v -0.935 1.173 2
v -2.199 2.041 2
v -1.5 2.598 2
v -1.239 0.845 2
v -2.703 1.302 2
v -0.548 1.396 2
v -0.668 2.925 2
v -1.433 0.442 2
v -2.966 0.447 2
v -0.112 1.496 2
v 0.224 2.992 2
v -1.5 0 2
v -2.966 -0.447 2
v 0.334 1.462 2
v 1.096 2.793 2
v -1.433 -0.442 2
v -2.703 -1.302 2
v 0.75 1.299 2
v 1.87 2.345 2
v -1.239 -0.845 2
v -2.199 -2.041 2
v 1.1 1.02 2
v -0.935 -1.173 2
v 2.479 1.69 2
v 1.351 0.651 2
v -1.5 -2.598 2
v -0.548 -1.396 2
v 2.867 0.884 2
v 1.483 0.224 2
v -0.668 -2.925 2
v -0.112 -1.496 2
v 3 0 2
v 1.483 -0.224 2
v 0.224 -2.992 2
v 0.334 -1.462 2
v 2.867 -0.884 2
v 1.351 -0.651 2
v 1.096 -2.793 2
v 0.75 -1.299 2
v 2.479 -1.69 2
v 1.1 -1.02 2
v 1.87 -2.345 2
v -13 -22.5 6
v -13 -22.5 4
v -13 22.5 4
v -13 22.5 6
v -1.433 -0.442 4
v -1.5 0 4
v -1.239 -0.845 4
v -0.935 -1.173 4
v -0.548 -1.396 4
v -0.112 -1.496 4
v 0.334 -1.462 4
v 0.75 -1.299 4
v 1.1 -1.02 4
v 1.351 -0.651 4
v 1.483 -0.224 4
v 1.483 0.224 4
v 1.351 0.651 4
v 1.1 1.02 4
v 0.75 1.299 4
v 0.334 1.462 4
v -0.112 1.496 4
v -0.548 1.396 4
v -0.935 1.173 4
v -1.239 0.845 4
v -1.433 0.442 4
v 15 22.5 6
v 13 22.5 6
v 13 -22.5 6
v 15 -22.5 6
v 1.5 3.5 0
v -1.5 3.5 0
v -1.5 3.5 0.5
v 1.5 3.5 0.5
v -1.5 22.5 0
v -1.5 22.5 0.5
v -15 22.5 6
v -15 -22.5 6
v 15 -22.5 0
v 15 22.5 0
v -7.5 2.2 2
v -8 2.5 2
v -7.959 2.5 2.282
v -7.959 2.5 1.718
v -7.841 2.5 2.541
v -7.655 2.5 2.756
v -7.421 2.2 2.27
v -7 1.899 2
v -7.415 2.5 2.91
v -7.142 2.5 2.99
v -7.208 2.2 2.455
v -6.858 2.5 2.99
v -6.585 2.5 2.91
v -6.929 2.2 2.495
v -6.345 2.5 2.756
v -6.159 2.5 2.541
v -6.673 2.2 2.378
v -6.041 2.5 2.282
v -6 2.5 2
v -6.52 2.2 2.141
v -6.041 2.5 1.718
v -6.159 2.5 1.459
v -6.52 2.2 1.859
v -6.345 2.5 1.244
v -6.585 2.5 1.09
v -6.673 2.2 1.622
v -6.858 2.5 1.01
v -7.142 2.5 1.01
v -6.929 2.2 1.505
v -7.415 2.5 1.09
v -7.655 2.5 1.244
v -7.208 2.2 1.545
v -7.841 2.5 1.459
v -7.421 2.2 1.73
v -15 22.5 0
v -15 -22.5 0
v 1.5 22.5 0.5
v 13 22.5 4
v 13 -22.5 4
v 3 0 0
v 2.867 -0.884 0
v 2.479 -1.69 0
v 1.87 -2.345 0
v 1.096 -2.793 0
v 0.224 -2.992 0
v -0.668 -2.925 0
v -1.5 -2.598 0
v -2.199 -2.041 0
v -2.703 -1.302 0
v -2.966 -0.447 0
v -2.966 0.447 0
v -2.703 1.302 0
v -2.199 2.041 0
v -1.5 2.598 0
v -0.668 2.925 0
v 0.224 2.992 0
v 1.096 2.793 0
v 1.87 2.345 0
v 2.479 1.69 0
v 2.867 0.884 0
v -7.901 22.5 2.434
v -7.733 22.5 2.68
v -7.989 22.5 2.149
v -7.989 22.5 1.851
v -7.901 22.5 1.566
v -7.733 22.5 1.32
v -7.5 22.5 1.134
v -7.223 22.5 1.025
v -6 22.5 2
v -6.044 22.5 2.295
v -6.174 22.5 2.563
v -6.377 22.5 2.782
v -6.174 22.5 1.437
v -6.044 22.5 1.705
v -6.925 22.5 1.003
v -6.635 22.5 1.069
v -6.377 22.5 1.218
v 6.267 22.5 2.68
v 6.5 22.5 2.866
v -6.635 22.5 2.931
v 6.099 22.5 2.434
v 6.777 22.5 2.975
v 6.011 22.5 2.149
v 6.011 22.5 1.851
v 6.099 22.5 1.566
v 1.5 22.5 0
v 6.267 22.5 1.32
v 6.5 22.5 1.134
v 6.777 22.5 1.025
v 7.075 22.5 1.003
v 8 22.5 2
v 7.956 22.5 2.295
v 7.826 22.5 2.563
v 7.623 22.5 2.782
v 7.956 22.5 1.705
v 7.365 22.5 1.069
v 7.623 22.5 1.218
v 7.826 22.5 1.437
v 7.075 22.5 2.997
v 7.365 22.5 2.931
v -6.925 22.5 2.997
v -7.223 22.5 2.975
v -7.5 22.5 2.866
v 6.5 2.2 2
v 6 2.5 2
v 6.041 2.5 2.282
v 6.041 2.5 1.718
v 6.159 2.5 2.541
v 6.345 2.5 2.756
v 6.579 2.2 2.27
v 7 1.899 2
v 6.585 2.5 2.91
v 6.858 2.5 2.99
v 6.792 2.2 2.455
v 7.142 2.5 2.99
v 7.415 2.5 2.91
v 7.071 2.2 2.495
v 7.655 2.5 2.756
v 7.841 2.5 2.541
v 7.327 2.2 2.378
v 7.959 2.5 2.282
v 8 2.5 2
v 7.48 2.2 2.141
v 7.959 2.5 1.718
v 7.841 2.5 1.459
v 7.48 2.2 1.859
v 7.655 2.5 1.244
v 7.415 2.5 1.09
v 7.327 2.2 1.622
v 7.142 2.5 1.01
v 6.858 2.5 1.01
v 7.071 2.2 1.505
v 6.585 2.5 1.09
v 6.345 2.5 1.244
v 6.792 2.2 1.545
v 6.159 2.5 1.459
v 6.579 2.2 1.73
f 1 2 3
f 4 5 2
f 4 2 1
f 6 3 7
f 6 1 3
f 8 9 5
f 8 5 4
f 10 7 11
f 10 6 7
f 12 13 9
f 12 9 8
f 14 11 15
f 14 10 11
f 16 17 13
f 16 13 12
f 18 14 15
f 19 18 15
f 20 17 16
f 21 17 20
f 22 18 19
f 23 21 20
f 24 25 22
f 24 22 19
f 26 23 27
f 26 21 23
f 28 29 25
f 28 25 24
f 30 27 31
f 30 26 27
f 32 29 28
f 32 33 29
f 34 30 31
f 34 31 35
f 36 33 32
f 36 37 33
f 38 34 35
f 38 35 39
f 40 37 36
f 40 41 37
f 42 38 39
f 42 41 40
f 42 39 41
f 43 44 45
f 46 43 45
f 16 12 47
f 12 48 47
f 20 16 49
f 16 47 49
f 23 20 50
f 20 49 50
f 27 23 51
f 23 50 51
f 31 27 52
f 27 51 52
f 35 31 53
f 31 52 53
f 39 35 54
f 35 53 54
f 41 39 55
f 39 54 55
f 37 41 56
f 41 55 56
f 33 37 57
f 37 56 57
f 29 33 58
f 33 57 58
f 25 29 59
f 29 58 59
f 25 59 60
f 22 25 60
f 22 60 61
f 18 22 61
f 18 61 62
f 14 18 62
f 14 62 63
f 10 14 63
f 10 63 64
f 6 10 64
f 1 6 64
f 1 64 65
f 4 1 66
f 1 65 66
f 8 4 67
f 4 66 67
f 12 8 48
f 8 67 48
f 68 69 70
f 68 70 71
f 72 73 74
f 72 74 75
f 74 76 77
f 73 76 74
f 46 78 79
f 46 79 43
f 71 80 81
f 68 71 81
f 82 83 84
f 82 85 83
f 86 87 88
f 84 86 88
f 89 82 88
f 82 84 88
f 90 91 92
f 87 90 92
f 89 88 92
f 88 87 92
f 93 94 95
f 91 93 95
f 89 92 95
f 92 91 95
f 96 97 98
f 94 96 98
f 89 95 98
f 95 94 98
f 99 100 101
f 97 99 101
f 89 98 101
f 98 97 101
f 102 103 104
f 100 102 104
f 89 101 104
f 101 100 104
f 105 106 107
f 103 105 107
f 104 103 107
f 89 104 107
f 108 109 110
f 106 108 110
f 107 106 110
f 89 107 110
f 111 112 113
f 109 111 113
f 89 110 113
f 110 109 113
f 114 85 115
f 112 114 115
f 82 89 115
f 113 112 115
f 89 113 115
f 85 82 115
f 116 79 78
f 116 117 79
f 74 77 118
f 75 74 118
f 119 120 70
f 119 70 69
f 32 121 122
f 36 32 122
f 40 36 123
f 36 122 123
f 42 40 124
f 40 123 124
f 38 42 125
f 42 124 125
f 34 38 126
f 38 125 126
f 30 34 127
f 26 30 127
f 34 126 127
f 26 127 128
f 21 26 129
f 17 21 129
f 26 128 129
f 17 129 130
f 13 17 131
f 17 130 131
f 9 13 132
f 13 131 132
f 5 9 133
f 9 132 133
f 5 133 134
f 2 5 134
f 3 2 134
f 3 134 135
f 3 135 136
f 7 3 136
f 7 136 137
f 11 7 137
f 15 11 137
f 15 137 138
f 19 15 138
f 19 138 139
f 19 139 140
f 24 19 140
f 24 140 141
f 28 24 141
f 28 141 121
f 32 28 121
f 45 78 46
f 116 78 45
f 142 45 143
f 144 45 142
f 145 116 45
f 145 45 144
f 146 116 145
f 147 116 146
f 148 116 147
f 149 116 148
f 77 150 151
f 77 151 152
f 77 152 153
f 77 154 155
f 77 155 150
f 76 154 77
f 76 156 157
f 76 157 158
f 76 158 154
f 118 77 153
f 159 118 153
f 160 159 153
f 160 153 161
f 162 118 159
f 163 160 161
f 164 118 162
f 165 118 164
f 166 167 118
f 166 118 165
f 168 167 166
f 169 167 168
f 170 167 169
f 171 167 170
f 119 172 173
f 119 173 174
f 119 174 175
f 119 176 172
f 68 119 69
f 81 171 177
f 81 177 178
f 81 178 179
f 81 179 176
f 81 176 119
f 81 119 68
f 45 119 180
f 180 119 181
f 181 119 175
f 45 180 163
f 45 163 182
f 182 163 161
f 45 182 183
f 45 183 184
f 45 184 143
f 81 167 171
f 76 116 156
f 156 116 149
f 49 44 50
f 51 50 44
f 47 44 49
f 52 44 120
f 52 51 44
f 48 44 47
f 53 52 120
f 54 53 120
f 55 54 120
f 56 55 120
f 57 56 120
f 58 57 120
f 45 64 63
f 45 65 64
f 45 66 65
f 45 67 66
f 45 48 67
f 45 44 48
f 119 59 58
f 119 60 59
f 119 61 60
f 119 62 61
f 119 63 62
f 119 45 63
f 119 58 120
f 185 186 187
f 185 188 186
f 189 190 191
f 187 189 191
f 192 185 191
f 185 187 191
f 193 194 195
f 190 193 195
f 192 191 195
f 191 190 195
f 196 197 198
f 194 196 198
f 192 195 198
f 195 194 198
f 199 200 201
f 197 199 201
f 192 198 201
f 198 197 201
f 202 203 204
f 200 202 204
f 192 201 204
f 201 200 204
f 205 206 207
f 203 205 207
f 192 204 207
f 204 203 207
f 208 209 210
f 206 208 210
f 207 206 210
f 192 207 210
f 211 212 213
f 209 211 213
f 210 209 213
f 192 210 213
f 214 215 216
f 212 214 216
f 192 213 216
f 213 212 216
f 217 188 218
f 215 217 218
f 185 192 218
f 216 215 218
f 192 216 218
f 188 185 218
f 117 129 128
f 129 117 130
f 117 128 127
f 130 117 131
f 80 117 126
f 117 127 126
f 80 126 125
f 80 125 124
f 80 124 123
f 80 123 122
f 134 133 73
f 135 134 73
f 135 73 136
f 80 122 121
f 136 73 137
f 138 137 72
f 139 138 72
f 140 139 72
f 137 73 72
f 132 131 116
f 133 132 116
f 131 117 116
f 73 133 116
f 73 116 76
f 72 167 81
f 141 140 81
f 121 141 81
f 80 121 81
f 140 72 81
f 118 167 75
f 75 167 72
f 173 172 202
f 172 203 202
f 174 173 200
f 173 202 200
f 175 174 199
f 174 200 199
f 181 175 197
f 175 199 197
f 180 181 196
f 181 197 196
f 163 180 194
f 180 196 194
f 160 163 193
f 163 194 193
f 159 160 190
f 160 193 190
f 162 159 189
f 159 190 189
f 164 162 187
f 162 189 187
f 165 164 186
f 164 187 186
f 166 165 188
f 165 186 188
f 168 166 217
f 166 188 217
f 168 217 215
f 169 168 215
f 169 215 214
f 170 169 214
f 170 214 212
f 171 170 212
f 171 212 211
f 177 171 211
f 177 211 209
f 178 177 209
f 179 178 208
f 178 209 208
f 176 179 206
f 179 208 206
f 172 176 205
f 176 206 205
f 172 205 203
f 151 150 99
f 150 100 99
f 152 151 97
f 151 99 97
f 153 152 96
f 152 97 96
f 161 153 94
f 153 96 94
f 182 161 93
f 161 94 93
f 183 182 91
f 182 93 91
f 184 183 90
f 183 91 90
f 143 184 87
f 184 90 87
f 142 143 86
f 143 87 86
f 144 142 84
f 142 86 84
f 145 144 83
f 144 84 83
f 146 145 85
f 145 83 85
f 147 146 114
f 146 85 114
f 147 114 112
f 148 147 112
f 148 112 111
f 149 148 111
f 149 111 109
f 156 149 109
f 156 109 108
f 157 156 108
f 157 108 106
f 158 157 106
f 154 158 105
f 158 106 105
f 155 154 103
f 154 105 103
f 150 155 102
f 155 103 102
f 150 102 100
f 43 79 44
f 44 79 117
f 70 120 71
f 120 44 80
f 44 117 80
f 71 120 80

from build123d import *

# Parameters (mm, degrees)
F0_W           = 30
F0_H           = 45
F1_DEPTH       = 4
F3_D           = 2
F3_DEPTH       = 20
F3_TIP         = 0.600860619
F4_W           = 2
F4_H           = 45
F5_DEPTH       = 2
F6_W           = 3
F6_H           = 19
F7_DEPTH       = 0.5
F8_D           = 3
F8_DEPTH       = 6
F8_CBORE_D     = 6
F8_CBORE_DEPTH = 2
F8_TIP         = 0.9012909285


with BuildPart() as f1:
    # F0 (on Top) → F1 (new body)
    with BuildSketch(Plane.XY):
        Rectangle(F0_W, F0_H)
    extrude(amount=F1_DEPTH)

    # F3
    with Locations(Plane(origin=(0, 22.5, 0), x_dir=(-1, 0, 0), z_dir=(0, 1, 0))):
        with Locations((-7, 2), (7, 2)):
            Hole(F3_D / 2, depth=F3_DEPTH)
            with Locations((0, 0, -(F3_DEPTH + F3_TIP / 2))):  # 118° drill point
                Cone(0, F3_D / 2, F3_TIP, mode=Mode.SUBTRACT)

    # F4 (on face) → F5 (join)
    with BuildSketch(Plane.XY.offset(4)):
        with Locations((-14, 0)):
            Rectangle(F4_W, F4_H)
        with Locations((14, 0)):
            Rectangle(F4_W, F4_H)
    extrude(amount=F5_DEPTH)

    # F6 (on face) → F7 (cut)
    with BuildSketch(Plane(origin=(0, 0, 0), x_dir=(1, 0, 0), z_dir=(0, 0, -1))):
        with Locations((0, -13)):
            Rectangle(F6_W, F6_H)
    extrude(amount=-F7_DEPTH, mode=Mode.SUBTRACT)

    # F8
    with Locations(Plane(origin=(0, 0, 0), x_dir=(1, 0, 0), z_dir=(0, 0, -1))):
        with Locations((0, 0)):
            CounterBoreHole(F8_D / 2, F8_CBORE_D / 2, F8_CBORE_DEPTH, depth=F8_DEPTH)
            with Locations((0, 0, -(F8_DEPTH + F8_TIP / 2))):  # 118° drill point
                Cone(0, F8_D / 2, F8_TIP, mode=Mode.SUBTRACT)


solid = f1.part
